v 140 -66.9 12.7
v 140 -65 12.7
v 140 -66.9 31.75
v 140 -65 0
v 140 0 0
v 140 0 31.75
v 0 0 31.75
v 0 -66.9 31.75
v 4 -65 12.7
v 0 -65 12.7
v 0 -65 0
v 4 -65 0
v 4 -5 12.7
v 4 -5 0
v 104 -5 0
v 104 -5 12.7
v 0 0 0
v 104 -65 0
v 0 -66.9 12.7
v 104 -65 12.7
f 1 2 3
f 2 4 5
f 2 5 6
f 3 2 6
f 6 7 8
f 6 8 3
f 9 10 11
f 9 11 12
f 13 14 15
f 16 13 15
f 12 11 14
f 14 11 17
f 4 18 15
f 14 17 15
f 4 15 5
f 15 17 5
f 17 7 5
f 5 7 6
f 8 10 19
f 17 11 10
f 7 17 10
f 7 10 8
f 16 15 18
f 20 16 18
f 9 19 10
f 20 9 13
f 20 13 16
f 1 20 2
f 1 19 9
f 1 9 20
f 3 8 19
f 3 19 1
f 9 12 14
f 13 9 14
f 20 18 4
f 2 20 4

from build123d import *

# Parameters (mm, degrees)
F0_W     = 140
F0_H     = 31.75
F1_DEPTH = 66.9
F3_DEPTH = 12.7


with BuildPart() as f1:
    # F0 (on Front) → F1 (new body)
    with BuildSketch(Plane.XZ):
        with Locations((70, 15.875)):
            Rectangle(F0_W, F0_H)
    extrude(amount=F1_DEPTH)

    # F2 (on face) → F3 (cut)
    with BuildSketch(Plane(origin=(0, 0, 0), x_dir=(1, 0, 0), z_dir=(0, 0, -1))):
        Polygon((0, 66.9), (0, 65), (4, 65), (4, 5), (104, 5), (104, 65), (140, 65), (140, 66.9), align=None)
    extrude(amount=-F3_DEPTH, mode=Mode.SUBTRACT)


solid = f1.part
